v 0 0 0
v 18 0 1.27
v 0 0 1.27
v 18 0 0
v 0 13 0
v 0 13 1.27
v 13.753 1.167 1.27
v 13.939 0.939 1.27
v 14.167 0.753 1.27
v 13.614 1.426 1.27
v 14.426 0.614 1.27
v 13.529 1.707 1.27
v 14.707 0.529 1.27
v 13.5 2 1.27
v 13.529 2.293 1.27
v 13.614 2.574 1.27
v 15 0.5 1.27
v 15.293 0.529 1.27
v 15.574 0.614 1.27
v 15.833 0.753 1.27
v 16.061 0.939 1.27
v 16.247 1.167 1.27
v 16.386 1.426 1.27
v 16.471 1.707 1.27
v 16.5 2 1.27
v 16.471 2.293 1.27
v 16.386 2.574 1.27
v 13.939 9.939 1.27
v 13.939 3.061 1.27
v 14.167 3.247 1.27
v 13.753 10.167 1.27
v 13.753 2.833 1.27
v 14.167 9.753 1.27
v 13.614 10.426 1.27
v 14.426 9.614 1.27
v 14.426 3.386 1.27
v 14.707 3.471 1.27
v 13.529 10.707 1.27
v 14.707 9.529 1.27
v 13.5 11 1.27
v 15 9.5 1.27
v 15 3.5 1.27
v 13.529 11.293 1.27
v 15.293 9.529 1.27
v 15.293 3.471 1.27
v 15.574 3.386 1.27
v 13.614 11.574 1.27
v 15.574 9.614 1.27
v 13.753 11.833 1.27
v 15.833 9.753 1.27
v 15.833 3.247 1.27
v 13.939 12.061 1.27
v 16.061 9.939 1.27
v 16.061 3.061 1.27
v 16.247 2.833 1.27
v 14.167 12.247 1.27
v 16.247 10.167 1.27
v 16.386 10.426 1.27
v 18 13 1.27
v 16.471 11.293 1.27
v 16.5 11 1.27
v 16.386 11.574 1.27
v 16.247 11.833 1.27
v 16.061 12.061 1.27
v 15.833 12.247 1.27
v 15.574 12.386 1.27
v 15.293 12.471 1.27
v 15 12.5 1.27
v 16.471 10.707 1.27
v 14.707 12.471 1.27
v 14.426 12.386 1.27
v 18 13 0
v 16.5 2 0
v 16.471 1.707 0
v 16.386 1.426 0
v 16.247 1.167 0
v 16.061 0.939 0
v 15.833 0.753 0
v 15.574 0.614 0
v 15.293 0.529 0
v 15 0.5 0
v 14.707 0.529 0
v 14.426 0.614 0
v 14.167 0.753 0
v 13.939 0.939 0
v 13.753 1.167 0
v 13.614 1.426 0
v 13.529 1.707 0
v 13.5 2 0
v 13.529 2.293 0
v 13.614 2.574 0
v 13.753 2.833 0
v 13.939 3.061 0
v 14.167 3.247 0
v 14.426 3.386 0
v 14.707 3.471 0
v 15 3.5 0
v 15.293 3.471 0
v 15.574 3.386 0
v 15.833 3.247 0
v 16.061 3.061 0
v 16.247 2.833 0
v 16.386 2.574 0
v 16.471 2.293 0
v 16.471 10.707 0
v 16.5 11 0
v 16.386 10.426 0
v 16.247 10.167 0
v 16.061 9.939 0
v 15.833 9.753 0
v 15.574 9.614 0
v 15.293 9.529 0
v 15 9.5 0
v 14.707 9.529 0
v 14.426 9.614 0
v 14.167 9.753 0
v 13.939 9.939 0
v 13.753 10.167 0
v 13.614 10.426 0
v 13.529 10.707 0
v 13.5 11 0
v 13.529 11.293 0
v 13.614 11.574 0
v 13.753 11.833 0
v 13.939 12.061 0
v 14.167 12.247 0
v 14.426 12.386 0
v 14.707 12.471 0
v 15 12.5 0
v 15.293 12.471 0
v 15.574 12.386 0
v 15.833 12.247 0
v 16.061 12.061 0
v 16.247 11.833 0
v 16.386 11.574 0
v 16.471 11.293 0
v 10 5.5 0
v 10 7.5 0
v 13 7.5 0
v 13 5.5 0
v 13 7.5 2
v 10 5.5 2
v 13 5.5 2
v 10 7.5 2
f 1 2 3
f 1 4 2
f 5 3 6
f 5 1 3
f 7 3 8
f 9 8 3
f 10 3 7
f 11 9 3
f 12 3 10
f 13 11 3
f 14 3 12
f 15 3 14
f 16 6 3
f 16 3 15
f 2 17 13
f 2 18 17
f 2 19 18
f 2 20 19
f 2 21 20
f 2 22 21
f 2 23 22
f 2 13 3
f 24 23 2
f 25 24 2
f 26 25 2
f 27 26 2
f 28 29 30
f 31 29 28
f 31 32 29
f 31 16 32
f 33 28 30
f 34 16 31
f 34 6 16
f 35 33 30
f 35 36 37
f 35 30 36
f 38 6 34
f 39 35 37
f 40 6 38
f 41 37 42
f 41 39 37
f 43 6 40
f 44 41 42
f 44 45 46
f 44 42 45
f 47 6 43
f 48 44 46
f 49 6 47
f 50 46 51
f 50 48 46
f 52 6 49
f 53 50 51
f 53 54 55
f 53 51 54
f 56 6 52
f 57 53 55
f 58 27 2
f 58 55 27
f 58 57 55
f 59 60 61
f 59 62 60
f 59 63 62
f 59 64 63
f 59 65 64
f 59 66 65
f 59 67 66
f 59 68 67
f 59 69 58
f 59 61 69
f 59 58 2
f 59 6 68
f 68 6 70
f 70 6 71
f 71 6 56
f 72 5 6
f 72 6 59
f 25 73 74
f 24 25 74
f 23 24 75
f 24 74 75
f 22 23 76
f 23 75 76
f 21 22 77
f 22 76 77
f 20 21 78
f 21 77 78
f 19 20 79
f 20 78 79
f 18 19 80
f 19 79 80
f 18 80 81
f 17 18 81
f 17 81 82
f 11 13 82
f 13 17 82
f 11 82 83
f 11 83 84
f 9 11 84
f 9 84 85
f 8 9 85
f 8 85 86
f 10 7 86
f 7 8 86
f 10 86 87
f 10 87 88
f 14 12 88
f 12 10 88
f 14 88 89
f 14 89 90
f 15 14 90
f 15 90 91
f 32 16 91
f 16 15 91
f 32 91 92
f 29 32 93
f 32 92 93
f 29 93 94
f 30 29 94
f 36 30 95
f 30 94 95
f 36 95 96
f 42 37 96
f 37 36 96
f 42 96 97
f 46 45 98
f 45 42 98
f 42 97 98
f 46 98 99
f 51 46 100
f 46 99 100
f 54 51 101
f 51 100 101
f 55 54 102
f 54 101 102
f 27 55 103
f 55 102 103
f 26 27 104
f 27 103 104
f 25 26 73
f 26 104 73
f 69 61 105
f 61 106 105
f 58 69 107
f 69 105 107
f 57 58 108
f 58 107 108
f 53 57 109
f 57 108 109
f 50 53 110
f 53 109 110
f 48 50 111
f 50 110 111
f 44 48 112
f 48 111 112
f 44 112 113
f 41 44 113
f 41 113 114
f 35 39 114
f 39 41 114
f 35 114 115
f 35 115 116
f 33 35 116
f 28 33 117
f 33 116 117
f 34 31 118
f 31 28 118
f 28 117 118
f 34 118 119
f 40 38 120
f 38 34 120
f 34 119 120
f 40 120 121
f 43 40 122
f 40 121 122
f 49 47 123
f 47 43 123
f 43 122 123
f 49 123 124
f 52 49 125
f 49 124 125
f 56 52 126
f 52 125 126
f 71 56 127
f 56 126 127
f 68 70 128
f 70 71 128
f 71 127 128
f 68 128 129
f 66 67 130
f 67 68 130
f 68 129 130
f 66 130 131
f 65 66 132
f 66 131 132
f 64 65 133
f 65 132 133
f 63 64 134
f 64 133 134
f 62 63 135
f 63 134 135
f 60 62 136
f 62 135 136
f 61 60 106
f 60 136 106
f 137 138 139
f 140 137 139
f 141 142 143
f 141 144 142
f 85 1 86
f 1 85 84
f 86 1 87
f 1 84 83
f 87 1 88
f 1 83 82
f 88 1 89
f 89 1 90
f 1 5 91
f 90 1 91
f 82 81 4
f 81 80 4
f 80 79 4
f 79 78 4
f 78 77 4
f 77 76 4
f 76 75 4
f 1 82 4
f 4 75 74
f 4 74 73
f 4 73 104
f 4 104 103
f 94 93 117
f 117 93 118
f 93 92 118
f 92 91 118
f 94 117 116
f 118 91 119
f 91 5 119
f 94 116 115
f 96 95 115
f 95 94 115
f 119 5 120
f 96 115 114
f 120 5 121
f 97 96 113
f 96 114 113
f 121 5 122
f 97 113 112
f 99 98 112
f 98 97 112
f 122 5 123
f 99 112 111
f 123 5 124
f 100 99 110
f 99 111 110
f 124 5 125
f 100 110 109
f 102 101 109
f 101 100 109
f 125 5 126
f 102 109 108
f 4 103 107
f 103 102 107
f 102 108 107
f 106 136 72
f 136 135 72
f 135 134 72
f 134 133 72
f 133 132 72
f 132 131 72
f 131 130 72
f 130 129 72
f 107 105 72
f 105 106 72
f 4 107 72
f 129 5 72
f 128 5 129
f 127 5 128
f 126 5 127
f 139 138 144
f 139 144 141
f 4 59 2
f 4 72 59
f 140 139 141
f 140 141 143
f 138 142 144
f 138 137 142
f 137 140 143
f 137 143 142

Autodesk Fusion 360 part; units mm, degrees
sketch "Esquisse1" plane through (0, 0, 0) normal (0, 0, 1) x (1, 0, 0)
  line L0 (0, 13) -> (18, 13)
  line L1 (18, 13) -> (18, 0)
  line L2 (18, 0) -> (0, 0)
  line L3 (0, 0) -> (0, 13)
  circle A0 centre (15, 11) radius 1.5
  circle A1 centre (15, 2) radius 1.5
  line L4 (10, 7.5) -> (13, 7.5)
  line L5 (13, 7.5) -> (13, 5.5)
  line L6 (13, 5.5) -> (10, 5.5)
  line L7 (10, 5.5) -> (10, 7.5)
  line L8 (0, 6.5) -> (10, 6.5) construction
  dimension "d1" = 18
  dimension "d2" = 13
  dimension "d5" = 3
  dimension "d6" = 3
extrude "Extrusion2" add sketch "Esquisse1" along normal blind 2 contours L4 L5 L6 L7 makes body 1
extrude "Extrusion1" add sketch "Esquisse1" along normal blind 1.27 separate body contours L0 L1 L2 L3 | L4 L5 L6 L7 makes body 2
